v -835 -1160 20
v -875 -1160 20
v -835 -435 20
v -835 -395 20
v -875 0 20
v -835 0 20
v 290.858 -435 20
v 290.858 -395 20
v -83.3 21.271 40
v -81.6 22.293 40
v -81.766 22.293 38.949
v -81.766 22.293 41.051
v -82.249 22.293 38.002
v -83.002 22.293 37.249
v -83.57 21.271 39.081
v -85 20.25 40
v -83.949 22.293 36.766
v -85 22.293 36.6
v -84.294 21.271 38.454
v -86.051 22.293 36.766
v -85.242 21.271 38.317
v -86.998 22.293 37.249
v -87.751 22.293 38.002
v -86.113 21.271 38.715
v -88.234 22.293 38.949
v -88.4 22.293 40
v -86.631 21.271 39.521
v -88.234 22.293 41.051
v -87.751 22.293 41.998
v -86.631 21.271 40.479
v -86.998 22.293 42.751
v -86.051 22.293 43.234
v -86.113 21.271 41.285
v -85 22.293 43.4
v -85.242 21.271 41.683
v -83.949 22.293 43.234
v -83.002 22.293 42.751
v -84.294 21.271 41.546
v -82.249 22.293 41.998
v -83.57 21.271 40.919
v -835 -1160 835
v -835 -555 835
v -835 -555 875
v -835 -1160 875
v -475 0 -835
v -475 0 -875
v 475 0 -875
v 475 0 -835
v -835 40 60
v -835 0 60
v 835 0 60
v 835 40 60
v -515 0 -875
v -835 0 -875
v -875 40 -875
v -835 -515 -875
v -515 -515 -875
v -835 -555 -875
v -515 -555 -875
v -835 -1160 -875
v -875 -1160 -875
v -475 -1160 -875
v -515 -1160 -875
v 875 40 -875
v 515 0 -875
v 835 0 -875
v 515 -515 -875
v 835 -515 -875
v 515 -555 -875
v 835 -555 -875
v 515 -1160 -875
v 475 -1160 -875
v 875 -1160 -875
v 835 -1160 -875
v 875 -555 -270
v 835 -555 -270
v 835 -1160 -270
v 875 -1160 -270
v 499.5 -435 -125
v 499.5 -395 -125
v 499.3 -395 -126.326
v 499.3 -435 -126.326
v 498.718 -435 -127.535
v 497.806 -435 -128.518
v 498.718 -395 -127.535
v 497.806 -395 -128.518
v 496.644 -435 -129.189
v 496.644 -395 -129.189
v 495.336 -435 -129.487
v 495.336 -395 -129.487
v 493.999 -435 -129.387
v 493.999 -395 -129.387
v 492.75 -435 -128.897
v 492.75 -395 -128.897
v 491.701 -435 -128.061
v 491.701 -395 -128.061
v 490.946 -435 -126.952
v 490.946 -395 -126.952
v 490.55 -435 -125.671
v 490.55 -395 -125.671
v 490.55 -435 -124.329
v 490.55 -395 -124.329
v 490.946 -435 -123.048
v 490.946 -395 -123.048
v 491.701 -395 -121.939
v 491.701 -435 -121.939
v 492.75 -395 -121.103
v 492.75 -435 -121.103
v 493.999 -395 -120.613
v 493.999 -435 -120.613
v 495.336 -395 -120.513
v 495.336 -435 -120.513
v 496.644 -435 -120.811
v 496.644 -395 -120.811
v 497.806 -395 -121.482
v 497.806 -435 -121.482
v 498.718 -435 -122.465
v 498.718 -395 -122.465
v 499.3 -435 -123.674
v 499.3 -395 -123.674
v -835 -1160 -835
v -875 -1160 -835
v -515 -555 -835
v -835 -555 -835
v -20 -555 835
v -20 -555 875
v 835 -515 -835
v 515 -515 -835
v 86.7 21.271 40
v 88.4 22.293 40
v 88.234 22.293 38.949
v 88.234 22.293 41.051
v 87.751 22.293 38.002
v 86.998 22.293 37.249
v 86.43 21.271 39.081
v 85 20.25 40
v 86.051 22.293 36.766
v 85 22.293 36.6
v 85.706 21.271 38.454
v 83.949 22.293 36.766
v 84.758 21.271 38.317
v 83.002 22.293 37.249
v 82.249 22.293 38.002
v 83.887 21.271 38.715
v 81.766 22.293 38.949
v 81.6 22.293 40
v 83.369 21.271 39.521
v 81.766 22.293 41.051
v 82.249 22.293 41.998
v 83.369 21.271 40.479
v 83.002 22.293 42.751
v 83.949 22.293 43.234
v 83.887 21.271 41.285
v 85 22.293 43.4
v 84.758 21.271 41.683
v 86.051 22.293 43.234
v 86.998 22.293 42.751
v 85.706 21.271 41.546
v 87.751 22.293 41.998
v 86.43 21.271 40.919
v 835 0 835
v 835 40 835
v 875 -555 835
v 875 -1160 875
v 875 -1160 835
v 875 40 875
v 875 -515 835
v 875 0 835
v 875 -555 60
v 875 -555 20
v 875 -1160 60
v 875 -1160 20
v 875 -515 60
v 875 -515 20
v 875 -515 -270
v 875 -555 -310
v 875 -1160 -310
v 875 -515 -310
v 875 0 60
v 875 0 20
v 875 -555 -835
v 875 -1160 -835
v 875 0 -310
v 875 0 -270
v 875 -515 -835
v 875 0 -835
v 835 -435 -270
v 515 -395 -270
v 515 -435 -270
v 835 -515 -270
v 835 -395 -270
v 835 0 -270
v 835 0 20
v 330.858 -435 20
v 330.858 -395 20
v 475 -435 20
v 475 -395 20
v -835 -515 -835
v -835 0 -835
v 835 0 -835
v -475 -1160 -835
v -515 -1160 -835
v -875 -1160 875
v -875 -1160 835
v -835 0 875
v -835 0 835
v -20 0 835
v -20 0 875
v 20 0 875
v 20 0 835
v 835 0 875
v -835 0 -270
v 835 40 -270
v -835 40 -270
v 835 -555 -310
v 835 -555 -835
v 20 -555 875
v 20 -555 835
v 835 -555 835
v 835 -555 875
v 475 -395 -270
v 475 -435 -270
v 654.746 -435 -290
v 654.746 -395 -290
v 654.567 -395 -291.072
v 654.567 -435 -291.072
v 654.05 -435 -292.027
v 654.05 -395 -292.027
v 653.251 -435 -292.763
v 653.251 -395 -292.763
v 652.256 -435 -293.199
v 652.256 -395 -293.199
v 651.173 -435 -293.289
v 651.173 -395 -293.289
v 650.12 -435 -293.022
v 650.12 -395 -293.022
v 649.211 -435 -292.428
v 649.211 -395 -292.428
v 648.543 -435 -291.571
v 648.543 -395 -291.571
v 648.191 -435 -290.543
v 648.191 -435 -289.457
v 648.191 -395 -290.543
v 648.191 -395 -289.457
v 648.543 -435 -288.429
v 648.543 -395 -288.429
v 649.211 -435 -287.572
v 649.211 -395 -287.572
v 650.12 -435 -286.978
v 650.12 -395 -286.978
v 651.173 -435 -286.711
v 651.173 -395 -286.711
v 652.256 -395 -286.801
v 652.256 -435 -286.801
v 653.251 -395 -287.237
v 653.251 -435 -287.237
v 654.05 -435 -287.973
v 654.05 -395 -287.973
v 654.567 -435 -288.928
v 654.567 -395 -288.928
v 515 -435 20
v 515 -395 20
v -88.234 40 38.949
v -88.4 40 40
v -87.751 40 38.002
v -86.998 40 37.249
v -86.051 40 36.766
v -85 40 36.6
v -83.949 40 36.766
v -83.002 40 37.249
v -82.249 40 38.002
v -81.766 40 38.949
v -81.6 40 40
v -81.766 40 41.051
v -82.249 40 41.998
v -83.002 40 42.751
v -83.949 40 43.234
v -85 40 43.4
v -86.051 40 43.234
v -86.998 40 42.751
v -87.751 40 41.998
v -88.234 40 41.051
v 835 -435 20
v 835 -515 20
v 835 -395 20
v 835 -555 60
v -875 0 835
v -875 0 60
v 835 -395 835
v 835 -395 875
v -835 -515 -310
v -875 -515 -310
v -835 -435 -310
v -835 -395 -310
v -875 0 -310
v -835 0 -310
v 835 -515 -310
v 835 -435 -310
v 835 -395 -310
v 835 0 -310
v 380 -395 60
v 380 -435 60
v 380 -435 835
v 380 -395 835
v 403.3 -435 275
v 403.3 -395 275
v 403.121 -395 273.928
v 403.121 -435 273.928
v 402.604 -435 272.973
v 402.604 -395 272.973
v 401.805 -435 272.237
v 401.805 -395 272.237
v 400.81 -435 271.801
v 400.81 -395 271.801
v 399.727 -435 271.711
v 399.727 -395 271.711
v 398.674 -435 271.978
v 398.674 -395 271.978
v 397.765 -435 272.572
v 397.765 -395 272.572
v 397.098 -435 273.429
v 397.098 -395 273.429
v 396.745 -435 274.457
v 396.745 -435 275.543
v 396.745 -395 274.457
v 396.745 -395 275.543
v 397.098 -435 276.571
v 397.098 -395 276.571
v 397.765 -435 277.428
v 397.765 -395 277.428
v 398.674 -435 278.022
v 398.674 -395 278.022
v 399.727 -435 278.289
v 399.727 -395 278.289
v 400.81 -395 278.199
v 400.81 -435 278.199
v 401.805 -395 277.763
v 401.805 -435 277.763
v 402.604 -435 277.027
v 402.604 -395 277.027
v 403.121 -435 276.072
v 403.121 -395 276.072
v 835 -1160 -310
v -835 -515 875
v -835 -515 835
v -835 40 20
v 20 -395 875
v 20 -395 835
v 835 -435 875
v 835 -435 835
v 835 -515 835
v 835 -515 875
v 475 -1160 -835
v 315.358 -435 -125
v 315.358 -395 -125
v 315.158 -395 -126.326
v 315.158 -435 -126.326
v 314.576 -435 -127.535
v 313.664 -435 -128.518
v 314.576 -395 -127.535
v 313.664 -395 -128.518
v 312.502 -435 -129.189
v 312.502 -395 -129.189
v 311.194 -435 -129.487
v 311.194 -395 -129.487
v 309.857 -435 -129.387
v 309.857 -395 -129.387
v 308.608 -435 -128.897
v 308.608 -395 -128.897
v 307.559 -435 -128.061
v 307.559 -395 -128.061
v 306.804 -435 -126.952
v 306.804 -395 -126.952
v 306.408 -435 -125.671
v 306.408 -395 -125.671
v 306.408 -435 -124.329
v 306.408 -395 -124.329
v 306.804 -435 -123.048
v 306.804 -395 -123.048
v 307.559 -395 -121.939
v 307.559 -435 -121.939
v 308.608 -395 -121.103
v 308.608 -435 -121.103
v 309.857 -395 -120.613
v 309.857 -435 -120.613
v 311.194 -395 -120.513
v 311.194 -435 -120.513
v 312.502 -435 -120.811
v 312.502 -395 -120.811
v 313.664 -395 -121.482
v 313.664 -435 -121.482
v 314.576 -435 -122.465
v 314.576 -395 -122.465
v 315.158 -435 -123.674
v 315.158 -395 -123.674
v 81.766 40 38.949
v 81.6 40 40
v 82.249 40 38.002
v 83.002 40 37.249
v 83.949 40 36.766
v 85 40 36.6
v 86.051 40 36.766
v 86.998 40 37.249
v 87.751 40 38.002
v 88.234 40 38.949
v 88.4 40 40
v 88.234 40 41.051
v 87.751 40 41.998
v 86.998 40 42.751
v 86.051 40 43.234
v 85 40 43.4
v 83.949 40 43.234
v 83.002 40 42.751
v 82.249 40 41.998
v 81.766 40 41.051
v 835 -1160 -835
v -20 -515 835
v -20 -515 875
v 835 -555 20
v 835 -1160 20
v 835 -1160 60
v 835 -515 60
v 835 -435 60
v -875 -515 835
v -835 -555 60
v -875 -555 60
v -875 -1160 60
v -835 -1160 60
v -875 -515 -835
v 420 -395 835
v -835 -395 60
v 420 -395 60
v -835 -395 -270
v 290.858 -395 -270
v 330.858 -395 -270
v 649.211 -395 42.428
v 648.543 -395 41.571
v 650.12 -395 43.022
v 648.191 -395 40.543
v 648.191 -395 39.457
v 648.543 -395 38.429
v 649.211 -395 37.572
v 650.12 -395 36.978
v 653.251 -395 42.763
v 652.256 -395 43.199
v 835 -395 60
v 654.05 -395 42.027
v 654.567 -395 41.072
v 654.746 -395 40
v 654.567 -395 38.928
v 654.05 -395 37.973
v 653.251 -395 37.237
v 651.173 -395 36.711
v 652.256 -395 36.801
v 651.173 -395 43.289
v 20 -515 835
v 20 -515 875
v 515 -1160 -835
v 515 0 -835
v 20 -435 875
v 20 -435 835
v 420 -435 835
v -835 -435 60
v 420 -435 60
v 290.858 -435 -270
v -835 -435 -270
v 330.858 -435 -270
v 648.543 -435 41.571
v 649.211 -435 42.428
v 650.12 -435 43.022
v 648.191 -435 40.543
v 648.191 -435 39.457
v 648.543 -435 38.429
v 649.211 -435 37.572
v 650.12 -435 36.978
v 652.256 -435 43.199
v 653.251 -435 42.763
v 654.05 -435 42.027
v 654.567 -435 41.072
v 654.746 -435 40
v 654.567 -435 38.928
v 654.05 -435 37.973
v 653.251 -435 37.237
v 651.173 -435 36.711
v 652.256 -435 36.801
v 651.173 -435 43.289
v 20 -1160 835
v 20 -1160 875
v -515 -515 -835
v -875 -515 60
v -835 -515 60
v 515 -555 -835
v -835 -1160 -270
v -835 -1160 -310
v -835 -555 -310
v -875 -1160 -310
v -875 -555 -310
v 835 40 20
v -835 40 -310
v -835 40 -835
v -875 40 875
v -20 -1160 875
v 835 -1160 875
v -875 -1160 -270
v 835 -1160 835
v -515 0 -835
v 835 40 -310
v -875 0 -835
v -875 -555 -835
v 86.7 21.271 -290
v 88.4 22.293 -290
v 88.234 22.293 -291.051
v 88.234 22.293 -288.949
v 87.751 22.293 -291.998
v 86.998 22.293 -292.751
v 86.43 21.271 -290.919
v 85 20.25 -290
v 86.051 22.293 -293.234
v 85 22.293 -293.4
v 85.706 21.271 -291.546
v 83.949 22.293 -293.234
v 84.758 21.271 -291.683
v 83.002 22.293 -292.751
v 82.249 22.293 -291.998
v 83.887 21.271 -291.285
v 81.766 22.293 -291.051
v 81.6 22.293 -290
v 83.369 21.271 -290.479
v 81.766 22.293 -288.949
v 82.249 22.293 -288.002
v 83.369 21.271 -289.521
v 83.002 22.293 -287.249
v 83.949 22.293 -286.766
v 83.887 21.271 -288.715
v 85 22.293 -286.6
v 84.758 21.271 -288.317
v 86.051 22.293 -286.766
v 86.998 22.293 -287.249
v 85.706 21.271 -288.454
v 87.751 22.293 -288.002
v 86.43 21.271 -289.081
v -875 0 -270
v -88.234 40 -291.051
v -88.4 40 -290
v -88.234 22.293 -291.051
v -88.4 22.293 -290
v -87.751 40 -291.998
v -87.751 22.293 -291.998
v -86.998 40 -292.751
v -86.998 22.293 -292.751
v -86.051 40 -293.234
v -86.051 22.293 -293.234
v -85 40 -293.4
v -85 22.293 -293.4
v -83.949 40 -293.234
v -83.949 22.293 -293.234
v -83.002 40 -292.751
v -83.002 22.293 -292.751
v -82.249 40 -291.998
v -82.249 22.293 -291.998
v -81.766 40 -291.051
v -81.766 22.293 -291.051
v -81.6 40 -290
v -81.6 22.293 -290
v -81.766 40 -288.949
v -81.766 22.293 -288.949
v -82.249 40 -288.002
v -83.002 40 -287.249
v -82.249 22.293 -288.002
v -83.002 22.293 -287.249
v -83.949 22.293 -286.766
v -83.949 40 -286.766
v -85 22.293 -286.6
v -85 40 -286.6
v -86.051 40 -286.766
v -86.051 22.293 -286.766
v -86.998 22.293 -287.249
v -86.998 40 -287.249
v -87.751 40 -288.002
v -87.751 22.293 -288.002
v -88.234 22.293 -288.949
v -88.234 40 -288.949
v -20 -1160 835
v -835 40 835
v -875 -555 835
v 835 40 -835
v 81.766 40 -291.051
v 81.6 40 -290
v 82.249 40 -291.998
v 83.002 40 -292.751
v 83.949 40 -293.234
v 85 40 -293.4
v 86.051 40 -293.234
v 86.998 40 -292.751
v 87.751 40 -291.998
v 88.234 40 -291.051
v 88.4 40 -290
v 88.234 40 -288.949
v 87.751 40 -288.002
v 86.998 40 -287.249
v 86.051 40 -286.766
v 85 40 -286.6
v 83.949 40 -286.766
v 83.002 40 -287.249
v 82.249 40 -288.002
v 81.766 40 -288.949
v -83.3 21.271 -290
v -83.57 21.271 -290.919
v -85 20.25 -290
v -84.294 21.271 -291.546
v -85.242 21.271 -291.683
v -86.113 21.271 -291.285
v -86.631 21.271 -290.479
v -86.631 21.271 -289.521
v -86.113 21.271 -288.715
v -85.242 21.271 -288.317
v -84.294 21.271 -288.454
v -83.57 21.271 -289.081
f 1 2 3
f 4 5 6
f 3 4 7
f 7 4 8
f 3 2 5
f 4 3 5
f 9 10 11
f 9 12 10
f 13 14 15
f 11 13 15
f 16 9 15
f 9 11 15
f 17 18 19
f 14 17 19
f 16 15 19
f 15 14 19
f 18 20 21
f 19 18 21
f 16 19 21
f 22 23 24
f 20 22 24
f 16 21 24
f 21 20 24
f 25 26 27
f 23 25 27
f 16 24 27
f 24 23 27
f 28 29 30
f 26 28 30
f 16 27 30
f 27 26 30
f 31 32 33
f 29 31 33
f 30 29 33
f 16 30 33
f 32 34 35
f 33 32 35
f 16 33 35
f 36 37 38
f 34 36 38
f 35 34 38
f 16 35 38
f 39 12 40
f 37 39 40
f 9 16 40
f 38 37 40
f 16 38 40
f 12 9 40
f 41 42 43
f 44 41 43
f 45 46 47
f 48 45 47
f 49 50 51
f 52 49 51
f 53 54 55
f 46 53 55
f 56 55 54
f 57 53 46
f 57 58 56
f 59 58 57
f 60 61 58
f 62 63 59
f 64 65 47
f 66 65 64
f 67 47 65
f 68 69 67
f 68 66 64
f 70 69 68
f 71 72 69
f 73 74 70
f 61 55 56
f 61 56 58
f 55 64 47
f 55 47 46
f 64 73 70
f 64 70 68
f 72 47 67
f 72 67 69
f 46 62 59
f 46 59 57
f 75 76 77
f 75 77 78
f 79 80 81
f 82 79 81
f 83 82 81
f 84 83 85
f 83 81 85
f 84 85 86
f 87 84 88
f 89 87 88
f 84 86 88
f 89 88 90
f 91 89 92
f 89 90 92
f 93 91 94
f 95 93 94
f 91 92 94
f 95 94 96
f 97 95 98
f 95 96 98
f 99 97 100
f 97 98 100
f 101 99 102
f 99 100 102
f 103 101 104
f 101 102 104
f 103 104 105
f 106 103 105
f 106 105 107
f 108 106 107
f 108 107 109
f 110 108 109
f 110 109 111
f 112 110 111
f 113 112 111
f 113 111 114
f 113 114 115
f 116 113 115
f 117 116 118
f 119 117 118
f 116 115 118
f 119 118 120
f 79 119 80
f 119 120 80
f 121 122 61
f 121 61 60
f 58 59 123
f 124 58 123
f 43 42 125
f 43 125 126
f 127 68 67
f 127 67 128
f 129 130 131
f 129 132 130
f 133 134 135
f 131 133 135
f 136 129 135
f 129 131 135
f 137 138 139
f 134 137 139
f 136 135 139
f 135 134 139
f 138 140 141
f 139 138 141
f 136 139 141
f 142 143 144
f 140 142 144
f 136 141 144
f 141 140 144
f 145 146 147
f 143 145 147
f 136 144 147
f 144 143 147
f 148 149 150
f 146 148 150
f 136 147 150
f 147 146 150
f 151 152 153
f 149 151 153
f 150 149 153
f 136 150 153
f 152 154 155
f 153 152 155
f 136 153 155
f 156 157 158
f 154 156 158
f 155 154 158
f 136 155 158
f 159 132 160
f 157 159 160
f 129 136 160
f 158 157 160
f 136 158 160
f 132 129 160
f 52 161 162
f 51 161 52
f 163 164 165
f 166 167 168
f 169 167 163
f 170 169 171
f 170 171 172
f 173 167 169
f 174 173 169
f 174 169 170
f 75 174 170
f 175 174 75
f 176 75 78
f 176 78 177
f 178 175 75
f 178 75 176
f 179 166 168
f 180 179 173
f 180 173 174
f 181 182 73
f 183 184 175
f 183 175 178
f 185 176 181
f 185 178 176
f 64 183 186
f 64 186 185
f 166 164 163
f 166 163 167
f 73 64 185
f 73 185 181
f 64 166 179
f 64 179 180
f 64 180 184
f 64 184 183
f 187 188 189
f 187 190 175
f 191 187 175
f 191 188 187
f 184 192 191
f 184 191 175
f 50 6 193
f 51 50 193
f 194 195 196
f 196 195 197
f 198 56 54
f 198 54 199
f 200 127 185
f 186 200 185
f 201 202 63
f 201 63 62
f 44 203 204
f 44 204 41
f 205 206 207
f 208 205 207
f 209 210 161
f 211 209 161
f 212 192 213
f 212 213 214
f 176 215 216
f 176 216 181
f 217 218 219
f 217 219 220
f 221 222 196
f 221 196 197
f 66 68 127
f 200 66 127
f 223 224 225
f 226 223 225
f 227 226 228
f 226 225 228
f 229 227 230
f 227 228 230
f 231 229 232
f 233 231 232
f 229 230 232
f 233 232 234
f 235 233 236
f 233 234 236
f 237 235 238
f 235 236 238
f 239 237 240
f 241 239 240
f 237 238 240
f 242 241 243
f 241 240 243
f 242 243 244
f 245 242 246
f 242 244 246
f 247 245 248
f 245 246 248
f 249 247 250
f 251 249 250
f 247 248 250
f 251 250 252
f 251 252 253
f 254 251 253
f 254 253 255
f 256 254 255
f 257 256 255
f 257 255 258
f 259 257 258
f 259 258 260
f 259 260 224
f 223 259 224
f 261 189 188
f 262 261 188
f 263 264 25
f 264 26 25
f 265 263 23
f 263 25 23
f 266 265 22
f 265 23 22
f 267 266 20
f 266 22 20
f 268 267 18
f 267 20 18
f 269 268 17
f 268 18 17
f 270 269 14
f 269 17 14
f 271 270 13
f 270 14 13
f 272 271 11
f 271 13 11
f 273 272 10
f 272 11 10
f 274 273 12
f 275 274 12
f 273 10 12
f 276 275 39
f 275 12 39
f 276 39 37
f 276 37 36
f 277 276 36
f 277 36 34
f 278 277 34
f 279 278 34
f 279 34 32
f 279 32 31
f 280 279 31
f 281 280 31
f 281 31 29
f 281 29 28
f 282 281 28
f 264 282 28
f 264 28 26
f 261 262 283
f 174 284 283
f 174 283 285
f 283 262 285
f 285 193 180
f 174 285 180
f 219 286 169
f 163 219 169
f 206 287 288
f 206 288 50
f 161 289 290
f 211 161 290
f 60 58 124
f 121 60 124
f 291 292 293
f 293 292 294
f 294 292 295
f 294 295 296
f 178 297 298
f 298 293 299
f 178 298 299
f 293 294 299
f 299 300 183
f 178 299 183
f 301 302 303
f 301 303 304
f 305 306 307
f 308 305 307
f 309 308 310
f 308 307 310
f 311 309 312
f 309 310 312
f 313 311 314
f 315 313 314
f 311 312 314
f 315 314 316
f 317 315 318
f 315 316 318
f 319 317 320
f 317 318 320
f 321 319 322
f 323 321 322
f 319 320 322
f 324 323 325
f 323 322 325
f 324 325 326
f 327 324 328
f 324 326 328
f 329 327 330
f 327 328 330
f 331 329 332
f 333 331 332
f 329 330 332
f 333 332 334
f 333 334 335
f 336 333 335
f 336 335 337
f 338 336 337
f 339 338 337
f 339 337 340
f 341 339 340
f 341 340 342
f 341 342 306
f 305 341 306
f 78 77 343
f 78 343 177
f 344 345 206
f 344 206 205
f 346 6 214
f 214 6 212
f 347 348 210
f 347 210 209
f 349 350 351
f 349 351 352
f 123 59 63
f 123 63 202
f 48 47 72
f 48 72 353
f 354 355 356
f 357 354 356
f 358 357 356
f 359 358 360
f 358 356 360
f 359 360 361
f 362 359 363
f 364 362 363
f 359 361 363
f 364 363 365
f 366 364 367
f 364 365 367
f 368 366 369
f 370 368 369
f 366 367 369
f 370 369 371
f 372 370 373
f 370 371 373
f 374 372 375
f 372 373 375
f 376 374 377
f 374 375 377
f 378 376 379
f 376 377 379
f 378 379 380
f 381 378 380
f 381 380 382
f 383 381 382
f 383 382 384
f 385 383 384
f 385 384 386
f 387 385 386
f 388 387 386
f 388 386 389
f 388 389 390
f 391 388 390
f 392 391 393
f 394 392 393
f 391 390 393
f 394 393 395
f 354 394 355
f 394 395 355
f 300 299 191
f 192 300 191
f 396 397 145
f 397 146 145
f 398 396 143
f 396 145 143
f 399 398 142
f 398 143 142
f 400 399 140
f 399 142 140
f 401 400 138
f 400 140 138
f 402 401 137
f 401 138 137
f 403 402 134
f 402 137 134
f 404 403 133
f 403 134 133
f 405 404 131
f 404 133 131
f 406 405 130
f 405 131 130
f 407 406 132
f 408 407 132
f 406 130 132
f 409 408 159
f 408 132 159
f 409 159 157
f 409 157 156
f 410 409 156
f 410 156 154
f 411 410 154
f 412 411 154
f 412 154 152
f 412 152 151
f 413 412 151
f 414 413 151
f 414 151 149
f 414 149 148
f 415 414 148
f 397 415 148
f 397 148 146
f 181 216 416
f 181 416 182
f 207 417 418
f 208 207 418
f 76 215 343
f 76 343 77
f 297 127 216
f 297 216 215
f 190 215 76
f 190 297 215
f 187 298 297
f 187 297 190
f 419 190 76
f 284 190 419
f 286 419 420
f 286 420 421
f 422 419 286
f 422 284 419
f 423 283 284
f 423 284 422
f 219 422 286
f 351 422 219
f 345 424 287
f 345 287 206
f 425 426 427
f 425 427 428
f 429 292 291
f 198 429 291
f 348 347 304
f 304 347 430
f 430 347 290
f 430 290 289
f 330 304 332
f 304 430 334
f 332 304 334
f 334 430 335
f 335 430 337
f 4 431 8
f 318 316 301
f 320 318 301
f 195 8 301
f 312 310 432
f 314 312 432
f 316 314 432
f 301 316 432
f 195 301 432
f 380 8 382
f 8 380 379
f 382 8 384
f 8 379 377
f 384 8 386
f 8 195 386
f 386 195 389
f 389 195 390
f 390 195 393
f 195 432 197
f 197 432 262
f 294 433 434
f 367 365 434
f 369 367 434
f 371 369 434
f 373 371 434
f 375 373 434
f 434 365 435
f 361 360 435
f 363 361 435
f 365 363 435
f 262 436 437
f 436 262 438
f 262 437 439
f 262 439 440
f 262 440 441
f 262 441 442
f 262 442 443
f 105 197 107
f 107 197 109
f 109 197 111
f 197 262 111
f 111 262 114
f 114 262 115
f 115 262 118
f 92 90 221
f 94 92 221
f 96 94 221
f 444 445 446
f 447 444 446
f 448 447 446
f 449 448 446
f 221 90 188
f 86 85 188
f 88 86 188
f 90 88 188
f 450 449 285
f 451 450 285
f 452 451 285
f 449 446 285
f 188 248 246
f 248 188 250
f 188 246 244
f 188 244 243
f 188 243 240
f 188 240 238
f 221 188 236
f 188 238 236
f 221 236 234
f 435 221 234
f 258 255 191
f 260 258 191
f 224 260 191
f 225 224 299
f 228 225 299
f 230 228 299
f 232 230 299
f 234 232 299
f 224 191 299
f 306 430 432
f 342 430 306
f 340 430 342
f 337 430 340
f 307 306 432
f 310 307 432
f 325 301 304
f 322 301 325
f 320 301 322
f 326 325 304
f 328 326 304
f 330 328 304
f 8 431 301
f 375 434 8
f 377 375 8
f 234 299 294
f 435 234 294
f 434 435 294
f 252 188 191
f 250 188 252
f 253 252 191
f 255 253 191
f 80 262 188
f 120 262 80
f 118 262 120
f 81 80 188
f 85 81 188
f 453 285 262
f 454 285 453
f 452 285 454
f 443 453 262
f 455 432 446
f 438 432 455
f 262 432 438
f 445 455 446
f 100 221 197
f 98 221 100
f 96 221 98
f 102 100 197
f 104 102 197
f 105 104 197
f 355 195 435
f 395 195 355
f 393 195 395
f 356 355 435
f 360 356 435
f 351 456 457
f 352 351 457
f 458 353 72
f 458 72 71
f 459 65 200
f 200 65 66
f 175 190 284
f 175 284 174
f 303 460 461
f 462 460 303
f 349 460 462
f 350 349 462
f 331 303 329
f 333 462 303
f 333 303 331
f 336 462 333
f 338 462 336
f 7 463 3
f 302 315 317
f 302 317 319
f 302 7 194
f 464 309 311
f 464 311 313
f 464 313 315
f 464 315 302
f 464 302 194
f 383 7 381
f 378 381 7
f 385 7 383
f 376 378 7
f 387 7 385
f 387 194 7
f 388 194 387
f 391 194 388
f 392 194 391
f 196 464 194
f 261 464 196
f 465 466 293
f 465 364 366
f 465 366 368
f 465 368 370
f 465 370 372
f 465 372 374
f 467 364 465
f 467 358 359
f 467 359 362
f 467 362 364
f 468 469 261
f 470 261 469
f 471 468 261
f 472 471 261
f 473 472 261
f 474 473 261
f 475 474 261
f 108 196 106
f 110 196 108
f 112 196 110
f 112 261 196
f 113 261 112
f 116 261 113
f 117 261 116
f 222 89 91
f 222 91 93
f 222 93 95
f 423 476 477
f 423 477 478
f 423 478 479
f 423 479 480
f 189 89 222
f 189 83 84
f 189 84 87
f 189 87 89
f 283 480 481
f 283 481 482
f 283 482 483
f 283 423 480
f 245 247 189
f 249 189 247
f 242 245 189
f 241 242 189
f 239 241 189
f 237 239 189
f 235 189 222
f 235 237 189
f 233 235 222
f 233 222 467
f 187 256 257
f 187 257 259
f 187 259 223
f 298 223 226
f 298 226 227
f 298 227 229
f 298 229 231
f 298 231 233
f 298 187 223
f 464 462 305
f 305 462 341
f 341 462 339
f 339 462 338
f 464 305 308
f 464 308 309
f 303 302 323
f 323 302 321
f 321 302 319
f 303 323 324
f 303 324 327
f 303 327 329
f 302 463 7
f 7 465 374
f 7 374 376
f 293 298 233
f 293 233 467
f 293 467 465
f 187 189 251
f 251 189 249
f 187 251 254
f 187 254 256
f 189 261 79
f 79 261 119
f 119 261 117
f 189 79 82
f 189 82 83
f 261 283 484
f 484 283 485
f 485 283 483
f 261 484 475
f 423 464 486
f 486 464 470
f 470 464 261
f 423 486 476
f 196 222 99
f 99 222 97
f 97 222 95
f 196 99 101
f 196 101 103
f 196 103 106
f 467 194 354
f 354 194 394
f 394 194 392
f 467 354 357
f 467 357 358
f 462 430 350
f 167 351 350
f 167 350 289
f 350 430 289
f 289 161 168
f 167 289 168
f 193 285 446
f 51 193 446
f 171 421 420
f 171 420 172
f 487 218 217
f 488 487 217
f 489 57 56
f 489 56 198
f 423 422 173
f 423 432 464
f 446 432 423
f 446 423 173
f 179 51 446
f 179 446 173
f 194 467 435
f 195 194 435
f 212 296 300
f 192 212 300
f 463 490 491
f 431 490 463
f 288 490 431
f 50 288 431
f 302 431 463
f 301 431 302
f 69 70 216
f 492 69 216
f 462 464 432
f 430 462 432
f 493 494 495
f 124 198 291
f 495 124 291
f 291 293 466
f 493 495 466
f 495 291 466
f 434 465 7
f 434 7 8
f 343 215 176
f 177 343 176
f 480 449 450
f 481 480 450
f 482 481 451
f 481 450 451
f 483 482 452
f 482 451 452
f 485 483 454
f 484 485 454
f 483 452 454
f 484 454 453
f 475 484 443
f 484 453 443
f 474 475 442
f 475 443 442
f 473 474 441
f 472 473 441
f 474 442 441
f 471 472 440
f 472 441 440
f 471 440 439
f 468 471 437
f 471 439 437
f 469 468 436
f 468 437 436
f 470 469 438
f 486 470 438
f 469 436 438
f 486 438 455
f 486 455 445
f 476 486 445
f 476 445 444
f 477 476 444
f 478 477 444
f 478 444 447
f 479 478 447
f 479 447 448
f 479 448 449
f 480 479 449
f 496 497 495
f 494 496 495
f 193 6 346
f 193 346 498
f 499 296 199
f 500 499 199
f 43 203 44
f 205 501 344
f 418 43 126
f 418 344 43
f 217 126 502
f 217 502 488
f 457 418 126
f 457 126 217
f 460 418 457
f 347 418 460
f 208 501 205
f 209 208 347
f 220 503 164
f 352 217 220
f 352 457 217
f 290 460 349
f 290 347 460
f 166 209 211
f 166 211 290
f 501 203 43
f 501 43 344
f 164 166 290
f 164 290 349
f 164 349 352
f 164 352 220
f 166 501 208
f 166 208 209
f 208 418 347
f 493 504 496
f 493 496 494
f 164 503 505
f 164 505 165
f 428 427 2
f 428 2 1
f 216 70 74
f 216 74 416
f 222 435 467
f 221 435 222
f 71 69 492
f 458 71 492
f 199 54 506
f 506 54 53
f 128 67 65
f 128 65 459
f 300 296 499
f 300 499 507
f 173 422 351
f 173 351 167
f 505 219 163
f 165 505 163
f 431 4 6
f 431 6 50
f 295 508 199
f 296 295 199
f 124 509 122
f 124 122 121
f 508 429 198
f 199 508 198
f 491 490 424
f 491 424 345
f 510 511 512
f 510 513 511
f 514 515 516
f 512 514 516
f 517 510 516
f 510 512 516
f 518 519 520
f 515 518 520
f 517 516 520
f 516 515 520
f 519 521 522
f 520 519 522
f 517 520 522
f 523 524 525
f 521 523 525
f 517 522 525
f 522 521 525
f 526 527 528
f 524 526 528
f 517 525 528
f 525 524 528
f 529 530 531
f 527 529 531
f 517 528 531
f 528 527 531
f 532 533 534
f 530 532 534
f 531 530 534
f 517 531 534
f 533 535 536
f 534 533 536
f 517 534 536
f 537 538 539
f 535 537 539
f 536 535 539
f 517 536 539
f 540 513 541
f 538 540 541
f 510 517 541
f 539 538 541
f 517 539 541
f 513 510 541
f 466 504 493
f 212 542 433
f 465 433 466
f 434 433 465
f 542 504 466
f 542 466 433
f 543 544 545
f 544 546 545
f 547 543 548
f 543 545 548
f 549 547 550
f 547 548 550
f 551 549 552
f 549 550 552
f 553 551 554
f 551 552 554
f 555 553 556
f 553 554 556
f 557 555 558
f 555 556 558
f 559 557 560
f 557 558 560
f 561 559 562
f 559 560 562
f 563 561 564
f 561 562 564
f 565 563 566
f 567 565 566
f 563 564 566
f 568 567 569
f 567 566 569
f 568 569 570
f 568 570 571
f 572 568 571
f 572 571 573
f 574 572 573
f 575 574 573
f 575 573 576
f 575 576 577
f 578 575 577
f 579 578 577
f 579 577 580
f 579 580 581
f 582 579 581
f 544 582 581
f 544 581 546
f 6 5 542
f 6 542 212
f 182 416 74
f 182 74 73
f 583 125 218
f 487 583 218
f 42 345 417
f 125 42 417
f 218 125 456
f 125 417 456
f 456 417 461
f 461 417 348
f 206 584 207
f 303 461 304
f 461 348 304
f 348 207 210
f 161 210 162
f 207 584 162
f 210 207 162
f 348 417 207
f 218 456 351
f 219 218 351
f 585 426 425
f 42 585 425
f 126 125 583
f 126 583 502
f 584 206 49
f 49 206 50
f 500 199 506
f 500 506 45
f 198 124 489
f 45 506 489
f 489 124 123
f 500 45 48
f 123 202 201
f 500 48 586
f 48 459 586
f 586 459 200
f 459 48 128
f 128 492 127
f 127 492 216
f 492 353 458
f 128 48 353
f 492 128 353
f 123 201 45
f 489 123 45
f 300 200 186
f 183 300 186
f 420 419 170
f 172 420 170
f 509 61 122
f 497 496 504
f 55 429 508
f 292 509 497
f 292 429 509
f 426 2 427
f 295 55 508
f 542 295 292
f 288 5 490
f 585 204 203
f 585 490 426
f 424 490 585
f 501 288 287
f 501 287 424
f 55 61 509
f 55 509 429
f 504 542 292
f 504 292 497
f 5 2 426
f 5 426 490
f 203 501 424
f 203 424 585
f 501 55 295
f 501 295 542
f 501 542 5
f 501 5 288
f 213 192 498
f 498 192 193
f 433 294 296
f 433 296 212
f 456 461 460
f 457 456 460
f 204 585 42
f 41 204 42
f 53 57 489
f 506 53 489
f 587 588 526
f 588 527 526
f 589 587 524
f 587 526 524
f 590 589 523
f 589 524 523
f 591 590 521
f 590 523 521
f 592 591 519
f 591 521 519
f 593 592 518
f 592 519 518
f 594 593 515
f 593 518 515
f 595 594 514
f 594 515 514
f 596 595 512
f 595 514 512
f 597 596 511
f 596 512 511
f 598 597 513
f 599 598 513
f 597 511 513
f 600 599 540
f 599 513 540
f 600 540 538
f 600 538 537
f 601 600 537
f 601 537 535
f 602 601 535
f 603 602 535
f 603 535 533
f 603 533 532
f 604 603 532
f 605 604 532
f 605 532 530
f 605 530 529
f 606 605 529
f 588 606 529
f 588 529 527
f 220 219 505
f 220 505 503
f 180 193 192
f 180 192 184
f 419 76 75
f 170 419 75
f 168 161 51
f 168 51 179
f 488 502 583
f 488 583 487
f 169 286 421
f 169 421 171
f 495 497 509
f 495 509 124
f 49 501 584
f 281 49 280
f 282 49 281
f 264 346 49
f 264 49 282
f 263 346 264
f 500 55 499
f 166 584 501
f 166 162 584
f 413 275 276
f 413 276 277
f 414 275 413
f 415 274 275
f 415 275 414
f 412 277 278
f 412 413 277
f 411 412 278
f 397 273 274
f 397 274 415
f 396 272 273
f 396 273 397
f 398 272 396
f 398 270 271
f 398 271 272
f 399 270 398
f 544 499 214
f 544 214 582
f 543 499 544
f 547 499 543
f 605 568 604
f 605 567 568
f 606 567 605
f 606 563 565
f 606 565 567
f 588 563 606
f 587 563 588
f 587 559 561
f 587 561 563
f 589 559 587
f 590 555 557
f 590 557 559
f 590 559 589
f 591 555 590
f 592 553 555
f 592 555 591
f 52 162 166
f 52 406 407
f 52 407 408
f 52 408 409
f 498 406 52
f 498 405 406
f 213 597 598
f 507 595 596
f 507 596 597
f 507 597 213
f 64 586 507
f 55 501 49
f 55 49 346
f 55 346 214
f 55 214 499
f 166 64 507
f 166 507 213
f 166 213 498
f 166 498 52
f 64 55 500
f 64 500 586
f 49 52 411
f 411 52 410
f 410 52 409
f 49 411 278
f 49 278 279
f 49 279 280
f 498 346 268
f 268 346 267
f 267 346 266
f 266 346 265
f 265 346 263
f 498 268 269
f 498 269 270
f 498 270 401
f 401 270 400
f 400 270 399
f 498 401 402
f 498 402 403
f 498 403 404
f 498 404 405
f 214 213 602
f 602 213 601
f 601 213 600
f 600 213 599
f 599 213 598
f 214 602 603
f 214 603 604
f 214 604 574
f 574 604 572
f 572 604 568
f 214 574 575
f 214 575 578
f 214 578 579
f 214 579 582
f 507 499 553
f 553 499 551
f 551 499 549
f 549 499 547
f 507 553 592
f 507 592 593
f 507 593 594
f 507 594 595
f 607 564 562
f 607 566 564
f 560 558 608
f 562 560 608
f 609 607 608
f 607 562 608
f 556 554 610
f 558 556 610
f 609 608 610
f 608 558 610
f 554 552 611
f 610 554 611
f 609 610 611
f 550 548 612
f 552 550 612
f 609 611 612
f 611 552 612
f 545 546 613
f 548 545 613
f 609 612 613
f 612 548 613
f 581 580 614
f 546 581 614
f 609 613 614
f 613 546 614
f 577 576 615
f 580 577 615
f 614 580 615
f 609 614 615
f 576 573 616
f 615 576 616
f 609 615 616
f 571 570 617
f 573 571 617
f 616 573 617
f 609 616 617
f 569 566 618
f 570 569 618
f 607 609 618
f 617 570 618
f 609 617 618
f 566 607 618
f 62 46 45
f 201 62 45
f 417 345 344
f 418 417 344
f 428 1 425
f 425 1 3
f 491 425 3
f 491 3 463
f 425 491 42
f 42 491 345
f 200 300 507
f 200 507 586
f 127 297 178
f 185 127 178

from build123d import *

# Parameters (mm, degrees)
SKETCH1_W             = 1750
SKETCH1_H             = 1750
SKETCH1_W_2           = 1670
SKETCH1_H_2           = 525
SKETCH1_H_3           = 775
BOSS_EXTRUDE1_DEPTH   = 40
SKETCH2_W             = 40
SKETCH2_H             = 40
BOSS_EXTRUDE2_DEPTH   = 1160
SKETCH3_W             = 40
SKETCH3_H             = 40
BOSS_EXTRUDE3_DEPTH   = 1710
SKETCH4_W             = 40
SKETCH4_H             = 40
BOSS_EXTRUDE4_DEPTH   = 1710
SKETCH5_W             = 40
SKETCH5_H             = 40
BOSS_EXTRUDE5_DEPTH   = 1710
SKETCH6_W             = 950
SKETCH6_H             = 40
CUT_EXTRUDE1_DEPTH    = 40
SKETCH9_W             = 290
SKETCH9_H             = 40
CUT_EXTRUDE4_DEPTH    = 40
M8_TAPPED_HOLE1_D     = 6.8
M8_TAPPED_HOLE1_DEPTH = 17.707073895
M8_TAPPED_HOLE1_TIP   = 2.042926105
SKETCH13_W            = 40
SKETCH13_H            = 40
BOSS_EXTRUDE6_DEPTH   = 1710
SKETCH15_W            = 815
SKETCH15_H            = 40
CUT_EXTRUDE5_DEPTH    = 40
SKETCH16_W            = 40
SKETCH16_H            = 40
BOSS_EXTRUDE7_DEPTH   = 815
SKETCH18_R            = 3.3
CUT_EXTRUDE6_DEPTH    = 40
SKETCH20_R            = 3.3
CUT_EXTRUDE8_DEPTH    = 40
SKETCH22_W            = 40
SKETCH22_H            = 40
BOSS_EXTRUDE8_DEPTH   = 330
SKETCH23_R            = 4.5
CUT_EXTRUDE9_DEPTH    = 40


with BuildPart() as part:
    # Sketch1 → Boss-Extrude1 (new body)
    with BuildSketch(Plane(origin=(0, 0, 0), x_dir=(1, 0, 0), z_dir=(0, 1, 0))):
        Rectangle(SKETCH1_W, SKETCH1_H)
        with Locations((0, 572.5)):
            Rectangle(SKETCH1_W_2, SKETCH1_H_2, mode=Mode.SUBTRACT)
        with Locations((0, -447.5)):
            Rectangle(SKETCH1_W_2, SKETCH1_H_3, mode=Mode.SUBTRACT)
        Polygon((-835, -20), (835, -20), (835, 20), (835, 270), (-835, 270), (-835, 20), align=None, mode=Mode.SUBTRACT)
    extrude(amount=BOSS_EXTRUDE1_DEPTH)

    # Sketch2 → Boss-Extrude2 (add)
    with BuildSketch(Plane.XZ):
        with Locations((-855, 855)):
            Rectangle(SKETCH2_W, SKETCH2_H)
        with Locations((855, 855)):
            Rectangle(SKETCH2_W, SKETCH2_H)
        with Locations((0, 855)):
            Rectangle(SKETCH2_W, SKETCH2_H)
        with Locations((855, 40)):
            Rectangle(SKETCH2_W, SKETCH2_H)
        with Locations((-855, 40)):
            Rectangle(SKETCH2_W, SKETCH2_H)
        with Locations((-855, -855)):
            Rectangle(SKETCH2_W, SKETCH2_H)
        with Locations((855, -855)):
            Rectangle(SKETCH2_W, SKETCH2_H)
        with Locations((495, -855)):
            Rectangle(SKETCH2_W, SKETCH2_H)
        with Locations((-495, -855)):
            Rectangle(SKETCH2_W, SKETCH2_H)
        with Locations((-855, -290)):
            Rectangle(SKETCH2_W, SKETCH2_H)
        with Locations((855, -290)):
            Rectangle(SKETCH2_W, SKETCH2_H)
    extrude(amount=BOSS_EXTRUDE2_DEPTH)

    # Sketch3 → Boss-Extrude3 (add)
    with BuildSketch(Plane.XY.offset(875)):
        with Locations((-855, -535)):
            Rectangle(SKETCH3_W, SKETCH3_H)
        with Locations((855, -535)):
            Rectangle(SKETCH3_W, SKETCH3_H)
    extrude(amount=-BOSS_EXTRUDE3_DEPTH)

    # Sketch4 → Boss-Extrude4 (add)
    with BuildSketch(Plane.ZY.offset(875)):
        with Locations((855, -535)):
            Rectangle(SKETCH4_W, SKETCH4_H)
    extrude(amount=-BOSS_EXTRUDE4_DEPTH)

    # Sketch5 → Boss-Extrude5 (add)
    with BuildSketch(Plane.ZY.offset(875)):
        with Locations((-855, -535)):
            Rectangle(SKETCH5_W, SKETCH5_H)
    extrude(amount=-BOSS_EXTRUDE5_DEPTH)

    # Sketch6 → Cut-Extrude1 (cut)
    with BuildSketch(Plane(origin=(0, 0, -875), x_dir=(-1, 0, 0), z_dir=(0, 0, -1))):
        with Locations((0, -535)):
            Rectangle(SKETCH6_W, SKETCH6_H)
    extrude(amount=-CUT_EXTRUDE1_DEPTH, mode=Mode.SUBTRACT)

    # Sketch9 → Cut-Extrude4 (cut)
    with BuildSketch(Plane.ZY.offset(875)):
        with Locations((-125, -535)):
            Rectangle(SKETCH9_W, SKETCH9_H)
    extrude(amount=-CUT_EXTRUDE4_DEPTH, mode=Mode.SUBTRACT)

    # M8 Tapped Hole1
    with Locations(Plane(origin=(0, 40, 0), x_dir=(1, 0, 0), z_dir=(0, 1, 0))):
        with Locations((85, -40), (-85, -40), (-85, 290), (85, 290)):
            Hole(M8_TAPPED_HOLE1_D / 2, depth=M8_TAPPED_HOLE1_DEPTH)
            with Locations((0, 0, -(M8_TAPPED_HOLE1_DEPTH + M8_TAPPED_HOLE1_TIP / 2))):  # 118° drill point
                Cone(0, M8_TAPPED_HOLE1_D / 2, M8_TAPPED_HOLE1_TIP, mode=Mode.SUBTRACT)

    # Sketch13 → Boss-Extrude6 (add)
    with BuildSketch(Plane(origin=(875, 0, 0), x_dir=(0, 0, -1), z_dir=(1, 0, 0))):
        with Locations((-40, -415)):
            Rectangle(SKETCH13_W, SKETCH13_H)
        with Locations((290, -415)):
            Rectangle(SKETCH13_W, SKETCH13_H)
        with Locations((-855, -415)):
            Rectangle(SKETCH13_W, SKETCH13_H)
    extrude(amount=-BOSS_EXTRUDE6_DEPTH)

    # Sketch15 → Cut-Extrude5 (cut)
    with BuildSketch(Plane.XY.offset(875)):
        with Locations((-427.5, -415)):
            Rectangle(SKETCH15_W, SKETCH15_H)
    extrude(amount=-CUT_EXTRUDE5_DEPTH, mode=Mode.SUBTRACT)

    # Sketch16 → Boss-Extrude7 (add)
    with BuildSketch(Plane.XY.offset(875)):
        with Locations((400, -415)):
            Rectangle(SKETCH16_W, SKETCH16_H)
    extrude(amount=-BOSS_EXTRUDE7_DEPTH)

    # Sketch18 → Cut-Extrude6 (cut)
    with BuildSketch(Plane(origin=(0, -395, 0), x_dir=(1, 0, 0), z_dir=(0, 1, 0))):
        with Locations((400, -275)):
            Circle(SKETCH18_R)
    extrude(amount=-CUT_EXTRUDE6_DEPTH, mode=Mode.SUBTRACT)

    # Sketch20 → Cut-Extrude8 (cut)
    with BuildSketch(Plane(origin=(0, -395, 0), x_dir=(1, 0, 0), z_dir=(0, 1, 0))):
        with Locations((651.445575403, -40)):
            Circle(SKETCH20_R)
        with Locations((651.445575403, 290)):
            Circle(SKETCH20_R)
    extrude(amount=-CUT_EXTRUDE8_DEPTH, mode=Mode.SUBTRACT)

    # Sketch22 → Boss-Extrude8 (add)
    with BuildSketch(Plane.XY.offset(60)):
        with Locations((495, -415)):
            Rectangle(SKETCH22_W, SKETCH22_H)
        with Locations((310.857864376, -415)):
            Rectangle(SKETCH22_W, SKETCH22_H)
    extrude(amount=-BOSS_EXTRUDE8_DEPTH)

    # Sketch23 → Cut-Extrude9 (cut)
    with BuildSketch(Plane(origin=(0, -395, 0), x_dir=(1, 0, 0), z_dir=(0, 1, 0))):
        with Locations((310.857864376, 125)):
            Circle(SKETCH23_R)
        with Locations((495, 125)):
            Circle(SKETCH23_R)
    extrude(amount=-CUT_EXTRUDE9_DEPTH, mode=Mode.SUBTRACT)


solid = part.part
